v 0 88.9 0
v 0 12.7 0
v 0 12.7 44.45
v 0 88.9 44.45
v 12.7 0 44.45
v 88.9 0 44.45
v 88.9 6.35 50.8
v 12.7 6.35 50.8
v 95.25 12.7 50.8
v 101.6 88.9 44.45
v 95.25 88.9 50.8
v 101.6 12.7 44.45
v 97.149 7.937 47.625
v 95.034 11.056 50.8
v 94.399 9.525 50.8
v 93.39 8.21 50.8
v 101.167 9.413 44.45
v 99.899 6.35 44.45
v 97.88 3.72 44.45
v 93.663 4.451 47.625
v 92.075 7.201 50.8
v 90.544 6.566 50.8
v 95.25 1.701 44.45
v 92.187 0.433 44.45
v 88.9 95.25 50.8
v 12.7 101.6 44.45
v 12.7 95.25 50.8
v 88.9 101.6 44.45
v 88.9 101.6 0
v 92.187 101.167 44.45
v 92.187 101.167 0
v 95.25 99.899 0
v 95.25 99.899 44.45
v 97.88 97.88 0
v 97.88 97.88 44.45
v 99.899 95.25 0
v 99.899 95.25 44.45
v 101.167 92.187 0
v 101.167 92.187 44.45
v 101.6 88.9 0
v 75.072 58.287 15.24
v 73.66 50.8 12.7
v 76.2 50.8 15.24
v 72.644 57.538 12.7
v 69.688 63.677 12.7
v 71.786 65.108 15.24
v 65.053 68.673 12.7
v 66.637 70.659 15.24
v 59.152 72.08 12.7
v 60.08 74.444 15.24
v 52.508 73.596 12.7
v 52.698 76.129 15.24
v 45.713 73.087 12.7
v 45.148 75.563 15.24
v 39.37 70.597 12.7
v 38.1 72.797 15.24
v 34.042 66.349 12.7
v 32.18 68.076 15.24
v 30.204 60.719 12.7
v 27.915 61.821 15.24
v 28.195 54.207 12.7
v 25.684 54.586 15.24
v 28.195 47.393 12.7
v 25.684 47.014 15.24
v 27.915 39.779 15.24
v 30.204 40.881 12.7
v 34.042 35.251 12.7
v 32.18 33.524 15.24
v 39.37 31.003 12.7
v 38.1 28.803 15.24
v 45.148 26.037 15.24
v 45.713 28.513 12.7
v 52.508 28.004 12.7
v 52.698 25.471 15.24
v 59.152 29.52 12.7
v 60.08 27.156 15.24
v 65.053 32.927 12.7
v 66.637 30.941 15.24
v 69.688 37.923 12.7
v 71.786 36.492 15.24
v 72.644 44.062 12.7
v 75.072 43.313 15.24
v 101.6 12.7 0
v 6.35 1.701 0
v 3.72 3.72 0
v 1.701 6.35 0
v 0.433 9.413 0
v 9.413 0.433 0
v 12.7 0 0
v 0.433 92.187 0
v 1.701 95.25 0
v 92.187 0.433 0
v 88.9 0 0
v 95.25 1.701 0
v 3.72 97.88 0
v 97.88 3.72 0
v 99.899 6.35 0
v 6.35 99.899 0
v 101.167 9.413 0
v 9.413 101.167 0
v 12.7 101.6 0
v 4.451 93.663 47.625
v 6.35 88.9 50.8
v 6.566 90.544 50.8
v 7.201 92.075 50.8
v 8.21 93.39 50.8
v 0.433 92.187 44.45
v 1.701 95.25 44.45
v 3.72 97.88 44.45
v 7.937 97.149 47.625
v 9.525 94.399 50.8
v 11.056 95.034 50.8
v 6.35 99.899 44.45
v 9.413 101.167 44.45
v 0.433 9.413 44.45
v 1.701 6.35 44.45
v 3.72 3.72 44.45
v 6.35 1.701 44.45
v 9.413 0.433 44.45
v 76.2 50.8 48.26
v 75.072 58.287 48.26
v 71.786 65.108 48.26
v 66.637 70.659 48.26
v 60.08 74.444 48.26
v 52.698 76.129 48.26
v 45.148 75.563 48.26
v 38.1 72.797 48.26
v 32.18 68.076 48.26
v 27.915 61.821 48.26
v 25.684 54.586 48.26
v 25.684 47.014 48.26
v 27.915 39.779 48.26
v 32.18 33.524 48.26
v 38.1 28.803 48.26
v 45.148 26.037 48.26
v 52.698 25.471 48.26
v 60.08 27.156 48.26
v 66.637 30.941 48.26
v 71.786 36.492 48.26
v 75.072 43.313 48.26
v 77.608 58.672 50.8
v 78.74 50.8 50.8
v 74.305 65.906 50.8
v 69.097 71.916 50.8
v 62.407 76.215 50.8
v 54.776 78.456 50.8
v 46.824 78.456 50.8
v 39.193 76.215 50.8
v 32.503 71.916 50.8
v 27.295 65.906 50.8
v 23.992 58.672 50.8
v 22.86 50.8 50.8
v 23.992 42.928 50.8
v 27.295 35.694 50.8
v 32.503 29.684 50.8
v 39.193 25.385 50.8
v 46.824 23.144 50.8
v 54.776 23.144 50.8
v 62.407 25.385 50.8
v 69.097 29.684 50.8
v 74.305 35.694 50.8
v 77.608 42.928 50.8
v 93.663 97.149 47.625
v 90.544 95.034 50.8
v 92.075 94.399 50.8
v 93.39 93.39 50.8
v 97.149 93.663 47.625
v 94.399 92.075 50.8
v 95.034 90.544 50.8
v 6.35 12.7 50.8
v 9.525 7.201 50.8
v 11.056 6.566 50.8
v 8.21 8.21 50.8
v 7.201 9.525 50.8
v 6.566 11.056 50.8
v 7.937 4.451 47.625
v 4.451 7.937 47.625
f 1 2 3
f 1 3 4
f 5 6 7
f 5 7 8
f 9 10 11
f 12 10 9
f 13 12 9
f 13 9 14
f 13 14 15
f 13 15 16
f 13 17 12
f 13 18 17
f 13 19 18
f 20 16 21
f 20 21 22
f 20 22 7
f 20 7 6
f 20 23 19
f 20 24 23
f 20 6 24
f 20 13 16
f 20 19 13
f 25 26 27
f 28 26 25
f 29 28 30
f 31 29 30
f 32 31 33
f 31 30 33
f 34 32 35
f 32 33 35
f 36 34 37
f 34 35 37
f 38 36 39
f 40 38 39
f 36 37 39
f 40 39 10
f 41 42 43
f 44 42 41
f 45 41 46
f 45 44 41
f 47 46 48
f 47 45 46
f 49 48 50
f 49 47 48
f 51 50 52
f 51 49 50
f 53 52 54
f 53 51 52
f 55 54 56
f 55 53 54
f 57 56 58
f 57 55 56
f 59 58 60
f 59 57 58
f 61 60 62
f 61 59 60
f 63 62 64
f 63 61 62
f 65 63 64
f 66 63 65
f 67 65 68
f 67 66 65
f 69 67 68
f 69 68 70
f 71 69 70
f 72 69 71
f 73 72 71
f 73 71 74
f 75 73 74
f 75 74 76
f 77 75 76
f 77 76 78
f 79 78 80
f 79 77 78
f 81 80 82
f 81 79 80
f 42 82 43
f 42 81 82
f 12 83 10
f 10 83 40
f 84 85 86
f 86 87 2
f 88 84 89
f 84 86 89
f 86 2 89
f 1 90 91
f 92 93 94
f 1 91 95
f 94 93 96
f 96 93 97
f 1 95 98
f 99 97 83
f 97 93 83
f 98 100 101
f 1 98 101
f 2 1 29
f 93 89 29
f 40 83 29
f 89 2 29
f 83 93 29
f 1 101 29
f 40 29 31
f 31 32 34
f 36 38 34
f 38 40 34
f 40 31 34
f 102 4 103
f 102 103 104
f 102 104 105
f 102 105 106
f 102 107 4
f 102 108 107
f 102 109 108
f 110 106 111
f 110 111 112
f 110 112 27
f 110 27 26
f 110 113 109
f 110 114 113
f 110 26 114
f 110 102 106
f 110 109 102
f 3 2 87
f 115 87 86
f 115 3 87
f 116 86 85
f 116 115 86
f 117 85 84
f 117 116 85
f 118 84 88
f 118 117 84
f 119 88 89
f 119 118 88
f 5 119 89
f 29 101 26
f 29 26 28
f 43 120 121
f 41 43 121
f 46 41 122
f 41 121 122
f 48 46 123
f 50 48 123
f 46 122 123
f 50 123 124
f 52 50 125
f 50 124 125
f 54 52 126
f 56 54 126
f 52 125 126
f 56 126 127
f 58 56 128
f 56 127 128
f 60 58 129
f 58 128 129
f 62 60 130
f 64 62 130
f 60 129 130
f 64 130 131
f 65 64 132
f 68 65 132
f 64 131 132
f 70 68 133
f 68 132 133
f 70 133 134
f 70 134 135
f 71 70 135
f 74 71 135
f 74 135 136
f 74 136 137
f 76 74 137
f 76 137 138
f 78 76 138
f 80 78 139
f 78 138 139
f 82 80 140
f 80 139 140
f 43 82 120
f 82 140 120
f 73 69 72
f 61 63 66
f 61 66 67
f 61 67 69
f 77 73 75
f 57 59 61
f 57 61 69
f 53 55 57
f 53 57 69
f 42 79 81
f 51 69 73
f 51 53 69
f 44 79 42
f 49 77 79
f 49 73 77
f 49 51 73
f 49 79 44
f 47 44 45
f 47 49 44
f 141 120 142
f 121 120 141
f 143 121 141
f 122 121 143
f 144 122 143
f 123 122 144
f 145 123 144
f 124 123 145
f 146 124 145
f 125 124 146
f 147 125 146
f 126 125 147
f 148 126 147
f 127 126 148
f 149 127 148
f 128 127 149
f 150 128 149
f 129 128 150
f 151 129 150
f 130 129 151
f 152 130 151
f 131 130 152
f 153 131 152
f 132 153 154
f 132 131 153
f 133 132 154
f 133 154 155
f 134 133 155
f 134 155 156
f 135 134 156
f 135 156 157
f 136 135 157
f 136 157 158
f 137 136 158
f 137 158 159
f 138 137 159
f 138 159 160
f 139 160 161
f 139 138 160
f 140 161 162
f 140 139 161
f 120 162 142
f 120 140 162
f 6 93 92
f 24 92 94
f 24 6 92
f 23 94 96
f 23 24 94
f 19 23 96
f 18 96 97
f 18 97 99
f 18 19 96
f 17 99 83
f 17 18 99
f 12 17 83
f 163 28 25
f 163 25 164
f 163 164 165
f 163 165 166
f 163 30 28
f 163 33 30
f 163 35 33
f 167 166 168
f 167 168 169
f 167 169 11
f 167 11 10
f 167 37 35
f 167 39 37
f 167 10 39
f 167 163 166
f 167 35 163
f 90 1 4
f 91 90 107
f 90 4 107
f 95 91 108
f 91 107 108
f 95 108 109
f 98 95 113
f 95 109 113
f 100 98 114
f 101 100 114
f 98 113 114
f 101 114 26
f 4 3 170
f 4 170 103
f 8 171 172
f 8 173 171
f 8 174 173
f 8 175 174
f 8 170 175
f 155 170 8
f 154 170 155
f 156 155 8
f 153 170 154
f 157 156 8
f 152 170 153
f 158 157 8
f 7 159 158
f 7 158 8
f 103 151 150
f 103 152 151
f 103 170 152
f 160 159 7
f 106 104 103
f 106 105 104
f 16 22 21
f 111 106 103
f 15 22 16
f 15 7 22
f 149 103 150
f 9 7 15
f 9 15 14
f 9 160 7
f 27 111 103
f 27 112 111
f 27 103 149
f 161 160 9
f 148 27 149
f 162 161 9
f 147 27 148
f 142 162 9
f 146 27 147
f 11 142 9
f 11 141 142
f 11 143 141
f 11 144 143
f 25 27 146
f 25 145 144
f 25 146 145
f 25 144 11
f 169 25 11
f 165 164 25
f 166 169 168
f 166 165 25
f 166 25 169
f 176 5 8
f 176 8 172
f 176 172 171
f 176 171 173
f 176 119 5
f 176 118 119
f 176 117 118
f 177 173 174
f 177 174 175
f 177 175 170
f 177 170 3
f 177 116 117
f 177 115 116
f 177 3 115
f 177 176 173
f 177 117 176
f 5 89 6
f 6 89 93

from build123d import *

# Parameters (mm, degrees)
F0_W     = 101.6
F0_H     = 101.6
F1_DEPTH = 50.8
F2_R     = 25.4
F3_DEPTH = 38.1
F4_R     = 12.7
F5_SIZE  = 2.54
F6_SIZE  = 6.35


with BuildPart() as f1:
    # F0 (on Top) → F1 (new body)
    with BuildSketch(Plane.XY):
        with Locations((50.8, 50.8)):
            Rectangle(F0_W, F0_H)
    extrude(amount=F1_DEPTH)

    # F2 (on face) → F3 (cut)
    with BuildSketch(Plane.XY.offset(50.8)):
        with Locations((50.8, 50.8)):
            Circle(F2_R)
    extrude(amount=-F3_DEPTH, mode=Mode.SUBTRACT)

    # F4
    f4_edges = [f1.edges().sort_by_distance(p)[0] for p in [
        (101.6, 0, 25.4),
        (0, 0, 25.4),
        (101.6, 101.6, 25.4),
        (0, 101.6, 25.4),
    ]]
    fillet(f4_edges, radius=F4_R)

    # F5
    f5_edges = [f1.edges().sort_by_distance(p)[0] for p in [
        (25.4, 50.8, 12.7),
        (25.4, 50.8, 50.8),
    ]]
    chamfer(f5_edges, length=F5_SIZE)

    # F6
    f6_edges = [f1.edges().sort_by_distance(p)[0] for p in [
        (0, 50.8, 50.8),
    ]]
    chamfer(f6_edges, length=F6_SIZE)


solid = f1.part
